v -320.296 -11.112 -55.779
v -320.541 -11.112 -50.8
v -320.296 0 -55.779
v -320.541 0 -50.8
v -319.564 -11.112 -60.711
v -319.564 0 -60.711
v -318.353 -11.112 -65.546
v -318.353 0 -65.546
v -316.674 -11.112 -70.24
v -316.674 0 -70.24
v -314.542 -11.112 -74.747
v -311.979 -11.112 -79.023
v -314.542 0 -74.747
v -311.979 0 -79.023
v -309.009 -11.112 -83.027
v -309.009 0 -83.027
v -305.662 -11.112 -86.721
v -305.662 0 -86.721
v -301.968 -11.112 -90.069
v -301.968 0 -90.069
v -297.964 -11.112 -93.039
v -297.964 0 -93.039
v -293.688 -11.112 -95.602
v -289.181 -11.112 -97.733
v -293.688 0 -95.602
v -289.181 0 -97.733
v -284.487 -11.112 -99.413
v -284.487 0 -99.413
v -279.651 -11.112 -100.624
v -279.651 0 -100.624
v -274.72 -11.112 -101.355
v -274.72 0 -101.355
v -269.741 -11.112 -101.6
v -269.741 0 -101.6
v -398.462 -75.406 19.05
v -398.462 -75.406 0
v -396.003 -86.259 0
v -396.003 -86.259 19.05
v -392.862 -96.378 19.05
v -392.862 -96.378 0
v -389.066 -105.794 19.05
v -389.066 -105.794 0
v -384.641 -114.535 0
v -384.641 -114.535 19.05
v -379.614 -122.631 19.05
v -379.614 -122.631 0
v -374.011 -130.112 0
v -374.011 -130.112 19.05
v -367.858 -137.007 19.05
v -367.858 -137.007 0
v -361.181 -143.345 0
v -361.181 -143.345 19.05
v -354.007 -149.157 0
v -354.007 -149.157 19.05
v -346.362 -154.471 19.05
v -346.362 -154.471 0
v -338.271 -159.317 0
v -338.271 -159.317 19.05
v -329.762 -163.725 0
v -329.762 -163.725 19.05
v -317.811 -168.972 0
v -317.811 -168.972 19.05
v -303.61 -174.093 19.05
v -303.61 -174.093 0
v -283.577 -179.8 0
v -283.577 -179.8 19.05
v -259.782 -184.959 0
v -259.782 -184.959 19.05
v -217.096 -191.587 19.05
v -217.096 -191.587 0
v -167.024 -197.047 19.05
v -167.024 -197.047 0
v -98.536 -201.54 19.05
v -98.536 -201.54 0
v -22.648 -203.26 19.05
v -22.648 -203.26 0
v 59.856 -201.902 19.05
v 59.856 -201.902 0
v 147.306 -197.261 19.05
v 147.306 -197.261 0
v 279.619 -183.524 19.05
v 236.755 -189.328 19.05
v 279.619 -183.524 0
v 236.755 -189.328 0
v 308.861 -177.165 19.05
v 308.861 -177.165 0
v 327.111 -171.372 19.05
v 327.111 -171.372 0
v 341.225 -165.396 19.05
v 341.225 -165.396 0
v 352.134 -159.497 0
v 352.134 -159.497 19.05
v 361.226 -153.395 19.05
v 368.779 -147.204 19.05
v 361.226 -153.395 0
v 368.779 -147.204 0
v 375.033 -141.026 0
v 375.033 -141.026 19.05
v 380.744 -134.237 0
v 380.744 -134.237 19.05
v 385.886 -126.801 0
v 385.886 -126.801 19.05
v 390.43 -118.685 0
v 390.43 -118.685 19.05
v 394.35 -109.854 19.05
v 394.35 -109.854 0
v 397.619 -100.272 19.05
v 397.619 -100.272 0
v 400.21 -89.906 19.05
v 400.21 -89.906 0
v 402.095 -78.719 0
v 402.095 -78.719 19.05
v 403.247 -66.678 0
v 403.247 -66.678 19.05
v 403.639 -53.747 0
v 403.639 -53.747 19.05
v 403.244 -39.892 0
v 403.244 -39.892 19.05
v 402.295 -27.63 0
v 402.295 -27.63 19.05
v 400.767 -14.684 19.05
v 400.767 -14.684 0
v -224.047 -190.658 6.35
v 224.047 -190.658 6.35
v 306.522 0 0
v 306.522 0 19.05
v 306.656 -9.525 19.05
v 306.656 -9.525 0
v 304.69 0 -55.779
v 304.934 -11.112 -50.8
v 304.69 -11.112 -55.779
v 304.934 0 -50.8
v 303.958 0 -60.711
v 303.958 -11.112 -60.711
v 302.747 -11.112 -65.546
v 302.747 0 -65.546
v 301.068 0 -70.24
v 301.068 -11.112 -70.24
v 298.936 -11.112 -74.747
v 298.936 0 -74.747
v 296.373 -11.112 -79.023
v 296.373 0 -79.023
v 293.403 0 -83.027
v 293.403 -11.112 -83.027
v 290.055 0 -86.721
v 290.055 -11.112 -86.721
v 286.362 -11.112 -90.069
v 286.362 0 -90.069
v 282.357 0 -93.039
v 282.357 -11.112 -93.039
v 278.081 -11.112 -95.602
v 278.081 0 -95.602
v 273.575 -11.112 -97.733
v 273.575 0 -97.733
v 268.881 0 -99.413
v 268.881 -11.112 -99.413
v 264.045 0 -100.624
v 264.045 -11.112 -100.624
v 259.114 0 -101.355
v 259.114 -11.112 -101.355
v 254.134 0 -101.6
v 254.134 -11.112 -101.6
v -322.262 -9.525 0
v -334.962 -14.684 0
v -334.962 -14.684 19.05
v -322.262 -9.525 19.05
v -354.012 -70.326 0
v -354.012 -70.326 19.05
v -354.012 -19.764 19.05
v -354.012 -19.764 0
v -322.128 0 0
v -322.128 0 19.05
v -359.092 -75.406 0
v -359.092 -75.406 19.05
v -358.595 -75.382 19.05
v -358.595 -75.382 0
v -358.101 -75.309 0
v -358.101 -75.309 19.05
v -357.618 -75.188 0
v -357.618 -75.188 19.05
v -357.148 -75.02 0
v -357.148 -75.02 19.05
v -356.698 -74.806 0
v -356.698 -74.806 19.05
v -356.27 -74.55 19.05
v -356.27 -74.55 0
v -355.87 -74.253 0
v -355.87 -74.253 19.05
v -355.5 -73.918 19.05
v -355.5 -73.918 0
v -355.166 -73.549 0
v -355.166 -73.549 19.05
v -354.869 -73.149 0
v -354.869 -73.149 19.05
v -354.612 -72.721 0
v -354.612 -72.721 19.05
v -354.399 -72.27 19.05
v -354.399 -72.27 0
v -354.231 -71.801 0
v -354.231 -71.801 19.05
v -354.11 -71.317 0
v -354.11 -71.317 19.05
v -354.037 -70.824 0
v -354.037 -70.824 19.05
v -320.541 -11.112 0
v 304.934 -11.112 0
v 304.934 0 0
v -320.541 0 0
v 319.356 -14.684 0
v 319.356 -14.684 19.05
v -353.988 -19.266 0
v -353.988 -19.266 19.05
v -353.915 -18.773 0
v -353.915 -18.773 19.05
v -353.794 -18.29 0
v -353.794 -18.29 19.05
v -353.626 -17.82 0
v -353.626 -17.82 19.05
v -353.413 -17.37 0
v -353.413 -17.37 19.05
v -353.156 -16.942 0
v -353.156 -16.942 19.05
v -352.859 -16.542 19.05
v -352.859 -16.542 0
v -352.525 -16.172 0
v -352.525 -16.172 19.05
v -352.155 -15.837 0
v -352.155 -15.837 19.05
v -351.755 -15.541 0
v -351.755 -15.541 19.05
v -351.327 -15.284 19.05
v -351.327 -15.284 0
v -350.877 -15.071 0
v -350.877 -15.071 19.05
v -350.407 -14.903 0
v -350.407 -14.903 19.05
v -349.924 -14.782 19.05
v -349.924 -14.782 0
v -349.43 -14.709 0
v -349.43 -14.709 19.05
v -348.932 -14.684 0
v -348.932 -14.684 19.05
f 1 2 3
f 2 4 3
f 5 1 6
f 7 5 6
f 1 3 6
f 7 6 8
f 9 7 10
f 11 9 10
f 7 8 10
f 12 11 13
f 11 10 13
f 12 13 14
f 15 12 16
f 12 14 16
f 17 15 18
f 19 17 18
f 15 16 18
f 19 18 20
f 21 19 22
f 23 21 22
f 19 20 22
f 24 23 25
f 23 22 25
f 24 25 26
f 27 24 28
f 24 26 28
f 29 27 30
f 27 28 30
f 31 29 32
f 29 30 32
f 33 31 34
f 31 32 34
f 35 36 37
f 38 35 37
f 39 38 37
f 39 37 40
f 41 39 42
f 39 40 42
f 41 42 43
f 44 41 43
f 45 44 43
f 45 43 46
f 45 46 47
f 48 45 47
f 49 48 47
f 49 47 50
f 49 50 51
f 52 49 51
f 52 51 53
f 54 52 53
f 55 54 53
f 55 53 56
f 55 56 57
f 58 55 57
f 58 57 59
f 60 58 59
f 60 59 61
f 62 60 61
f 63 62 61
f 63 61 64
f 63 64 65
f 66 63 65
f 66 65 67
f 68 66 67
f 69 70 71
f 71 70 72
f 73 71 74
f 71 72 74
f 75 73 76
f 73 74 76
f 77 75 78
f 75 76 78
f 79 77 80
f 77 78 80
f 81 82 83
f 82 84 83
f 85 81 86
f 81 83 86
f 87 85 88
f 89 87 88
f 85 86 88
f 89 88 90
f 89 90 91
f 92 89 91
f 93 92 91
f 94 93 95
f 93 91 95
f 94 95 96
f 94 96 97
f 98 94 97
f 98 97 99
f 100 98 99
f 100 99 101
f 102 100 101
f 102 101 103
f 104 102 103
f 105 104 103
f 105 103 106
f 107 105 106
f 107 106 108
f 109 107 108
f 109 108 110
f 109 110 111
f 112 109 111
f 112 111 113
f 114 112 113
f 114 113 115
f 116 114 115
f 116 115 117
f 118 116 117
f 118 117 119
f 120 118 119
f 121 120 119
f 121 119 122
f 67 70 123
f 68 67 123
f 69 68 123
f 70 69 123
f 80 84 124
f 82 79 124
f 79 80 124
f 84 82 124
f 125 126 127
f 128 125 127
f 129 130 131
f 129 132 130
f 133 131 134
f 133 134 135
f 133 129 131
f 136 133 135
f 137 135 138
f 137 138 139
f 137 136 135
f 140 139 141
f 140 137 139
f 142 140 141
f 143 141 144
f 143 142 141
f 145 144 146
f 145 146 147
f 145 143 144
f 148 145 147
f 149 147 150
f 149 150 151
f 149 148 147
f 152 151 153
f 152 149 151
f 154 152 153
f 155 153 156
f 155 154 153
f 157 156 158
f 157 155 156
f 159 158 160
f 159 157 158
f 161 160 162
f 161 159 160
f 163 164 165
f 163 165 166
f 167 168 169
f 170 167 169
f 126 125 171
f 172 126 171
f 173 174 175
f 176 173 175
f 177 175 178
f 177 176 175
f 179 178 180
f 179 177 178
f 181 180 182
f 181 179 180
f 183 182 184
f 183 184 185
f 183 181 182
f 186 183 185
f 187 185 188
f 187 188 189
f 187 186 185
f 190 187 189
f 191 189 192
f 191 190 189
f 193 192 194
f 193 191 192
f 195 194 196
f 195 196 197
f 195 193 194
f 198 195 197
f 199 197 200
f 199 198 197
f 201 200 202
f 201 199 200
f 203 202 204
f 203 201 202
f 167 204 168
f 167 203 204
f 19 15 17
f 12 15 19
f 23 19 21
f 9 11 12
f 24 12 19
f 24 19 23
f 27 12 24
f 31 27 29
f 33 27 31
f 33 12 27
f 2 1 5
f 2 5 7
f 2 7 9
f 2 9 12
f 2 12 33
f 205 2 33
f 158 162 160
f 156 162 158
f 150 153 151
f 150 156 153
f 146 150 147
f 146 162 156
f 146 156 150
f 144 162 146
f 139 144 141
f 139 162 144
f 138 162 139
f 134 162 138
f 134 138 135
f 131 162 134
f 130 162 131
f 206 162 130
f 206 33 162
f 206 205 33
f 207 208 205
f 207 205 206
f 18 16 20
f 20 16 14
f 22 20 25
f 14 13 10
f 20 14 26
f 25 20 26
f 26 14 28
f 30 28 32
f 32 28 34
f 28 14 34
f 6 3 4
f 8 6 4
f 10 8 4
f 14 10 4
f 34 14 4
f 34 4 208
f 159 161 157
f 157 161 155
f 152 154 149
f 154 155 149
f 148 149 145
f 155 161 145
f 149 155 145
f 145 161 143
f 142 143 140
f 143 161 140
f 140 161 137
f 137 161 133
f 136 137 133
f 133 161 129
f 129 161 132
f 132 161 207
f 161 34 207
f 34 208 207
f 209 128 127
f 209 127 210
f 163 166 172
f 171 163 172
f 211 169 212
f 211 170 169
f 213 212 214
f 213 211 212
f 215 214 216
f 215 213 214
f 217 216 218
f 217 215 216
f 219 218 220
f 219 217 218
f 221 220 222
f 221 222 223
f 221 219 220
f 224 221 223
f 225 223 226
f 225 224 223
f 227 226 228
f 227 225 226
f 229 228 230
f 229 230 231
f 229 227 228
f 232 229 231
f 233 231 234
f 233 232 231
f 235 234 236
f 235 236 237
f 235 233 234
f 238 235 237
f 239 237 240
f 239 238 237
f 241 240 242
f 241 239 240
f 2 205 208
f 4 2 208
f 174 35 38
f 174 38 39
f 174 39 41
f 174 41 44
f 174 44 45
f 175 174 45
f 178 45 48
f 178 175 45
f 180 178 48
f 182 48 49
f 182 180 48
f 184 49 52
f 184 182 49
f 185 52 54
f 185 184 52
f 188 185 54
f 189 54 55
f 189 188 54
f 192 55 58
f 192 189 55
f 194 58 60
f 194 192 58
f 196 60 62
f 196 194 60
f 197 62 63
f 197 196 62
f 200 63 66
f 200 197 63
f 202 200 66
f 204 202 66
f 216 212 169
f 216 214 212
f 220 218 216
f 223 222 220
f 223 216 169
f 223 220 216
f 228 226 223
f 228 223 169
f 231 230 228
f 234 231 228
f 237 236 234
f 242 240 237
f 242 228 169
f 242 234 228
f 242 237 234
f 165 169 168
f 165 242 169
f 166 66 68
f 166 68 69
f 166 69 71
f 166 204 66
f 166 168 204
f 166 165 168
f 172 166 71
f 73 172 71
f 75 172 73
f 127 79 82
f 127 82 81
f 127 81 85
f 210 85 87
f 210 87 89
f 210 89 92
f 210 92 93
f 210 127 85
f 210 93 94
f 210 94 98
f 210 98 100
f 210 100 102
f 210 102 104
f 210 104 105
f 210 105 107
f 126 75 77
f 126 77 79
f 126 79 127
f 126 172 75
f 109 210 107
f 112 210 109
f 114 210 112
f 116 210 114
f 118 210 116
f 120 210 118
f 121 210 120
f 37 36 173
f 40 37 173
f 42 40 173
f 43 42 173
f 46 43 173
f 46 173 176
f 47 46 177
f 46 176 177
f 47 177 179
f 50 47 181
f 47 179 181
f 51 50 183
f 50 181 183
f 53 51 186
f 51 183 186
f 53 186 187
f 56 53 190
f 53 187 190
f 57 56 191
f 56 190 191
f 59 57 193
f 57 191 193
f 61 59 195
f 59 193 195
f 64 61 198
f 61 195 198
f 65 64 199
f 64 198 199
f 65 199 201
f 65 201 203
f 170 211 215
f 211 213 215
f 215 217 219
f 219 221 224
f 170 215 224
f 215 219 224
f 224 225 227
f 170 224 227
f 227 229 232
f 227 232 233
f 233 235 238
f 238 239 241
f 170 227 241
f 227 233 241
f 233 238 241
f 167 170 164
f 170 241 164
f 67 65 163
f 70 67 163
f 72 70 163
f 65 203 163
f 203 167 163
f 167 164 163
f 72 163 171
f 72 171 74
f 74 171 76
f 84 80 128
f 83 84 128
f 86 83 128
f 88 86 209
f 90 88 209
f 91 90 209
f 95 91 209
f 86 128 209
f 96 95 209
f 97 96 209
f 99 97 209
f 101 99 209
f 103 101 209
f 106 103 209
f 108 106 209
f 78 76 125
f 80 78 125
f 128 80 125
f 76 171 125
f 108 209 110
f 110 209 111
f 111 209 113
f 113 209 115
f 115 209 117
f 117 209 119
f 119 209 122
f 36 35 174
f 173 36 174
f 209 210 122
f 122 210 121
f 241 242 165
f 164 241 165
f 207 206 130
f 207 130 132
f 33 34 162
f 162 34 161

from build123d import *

# Parameters (mm, degrees)
F1_DEPTH = 19.05
F3_DEPTH = 25.4
F4_W     = 625.475
F4_H     = 11.1125
F5_DEPTH = 101.6
F6_R     = 50.8
F7_R     = 5.08


with BuildPart() as f1:
    # F0 (on Top) → F1 (new body)
    with BuildSketch(Plane.XY):
        with BuildLine():
            Line((398.4625, 0), (-398.4625, 0))
            Line((-398.4625, 0), (-398.4625, -75.40625))
            add(Edge.make_bspline(
                [(-398.4625, -75.40625), (-382.7767657486, -158.8698293815), (-186.1213914705, -212.4356276363), (207.7106026788, -201.6622700018), (427.1077817692, -162.9815576871), (398.4625, 0)],
                knots=[0.0603535709, 0.0603535709, 0.0603535709, 0.0603535709, 0.3014904815, 0.6985095185, 1, 1, 1, 1], degree=3))
        make_face()
    extrude(amount=F1_DEPTH)

    # F2 (on face) → F3 (cut)
    with BuildSketch(Plane.XY.offset(19.05)):
        Polygon((-322.1280574799, 0), (-398.4625, 0), (-398.4625, -75.40625), (-354.0125, -75.40625), (-354.0125, -14.684375), (-334.9625, -14.684375), (-322.2625, -9.525), align=None)
        Polygon((398.4625, 0), (382.8563850403, 0), (306.5219425201, 0), (306.6563850403, -9.525), (319.3563850403, -14.684375), (338.4063850403, -14.684375), (402.6769697666, -14.684375), align=None)
    extrude(amount=-F3_DEPTH, mode=Mode.SUBTRACT)

    # F7
    f7_edges = [f1.edges().sort_by_distance(p)[0] for p in [
        (-354.0125, -75.40625, 9.525),
        (-354.0125, -14.684375, 9.525),
    ]]
    fillet(f7_edges, radius=F7_R)


with BuildPart() as f5:
    # F4 (on Top) → F5 (new body)
    with BuildSketch(Plane.XY):
        with Locations((-7.8030574799, -5.55625)):
            Rectangle(F4_W, F4_H)
    extrude(amount=-F5_DEPTH)

    # F6
    f6_edges = [f5.edges().sort_by_distance(p)[0] for p in [
        (-320.540557, -5.55625, -101.6),
        (304.934443, -5.55625, -101.6),
    ]]
    fillet(f6_edges, radius=F6_R)


solid = Compound([f1.part, f5.part])
